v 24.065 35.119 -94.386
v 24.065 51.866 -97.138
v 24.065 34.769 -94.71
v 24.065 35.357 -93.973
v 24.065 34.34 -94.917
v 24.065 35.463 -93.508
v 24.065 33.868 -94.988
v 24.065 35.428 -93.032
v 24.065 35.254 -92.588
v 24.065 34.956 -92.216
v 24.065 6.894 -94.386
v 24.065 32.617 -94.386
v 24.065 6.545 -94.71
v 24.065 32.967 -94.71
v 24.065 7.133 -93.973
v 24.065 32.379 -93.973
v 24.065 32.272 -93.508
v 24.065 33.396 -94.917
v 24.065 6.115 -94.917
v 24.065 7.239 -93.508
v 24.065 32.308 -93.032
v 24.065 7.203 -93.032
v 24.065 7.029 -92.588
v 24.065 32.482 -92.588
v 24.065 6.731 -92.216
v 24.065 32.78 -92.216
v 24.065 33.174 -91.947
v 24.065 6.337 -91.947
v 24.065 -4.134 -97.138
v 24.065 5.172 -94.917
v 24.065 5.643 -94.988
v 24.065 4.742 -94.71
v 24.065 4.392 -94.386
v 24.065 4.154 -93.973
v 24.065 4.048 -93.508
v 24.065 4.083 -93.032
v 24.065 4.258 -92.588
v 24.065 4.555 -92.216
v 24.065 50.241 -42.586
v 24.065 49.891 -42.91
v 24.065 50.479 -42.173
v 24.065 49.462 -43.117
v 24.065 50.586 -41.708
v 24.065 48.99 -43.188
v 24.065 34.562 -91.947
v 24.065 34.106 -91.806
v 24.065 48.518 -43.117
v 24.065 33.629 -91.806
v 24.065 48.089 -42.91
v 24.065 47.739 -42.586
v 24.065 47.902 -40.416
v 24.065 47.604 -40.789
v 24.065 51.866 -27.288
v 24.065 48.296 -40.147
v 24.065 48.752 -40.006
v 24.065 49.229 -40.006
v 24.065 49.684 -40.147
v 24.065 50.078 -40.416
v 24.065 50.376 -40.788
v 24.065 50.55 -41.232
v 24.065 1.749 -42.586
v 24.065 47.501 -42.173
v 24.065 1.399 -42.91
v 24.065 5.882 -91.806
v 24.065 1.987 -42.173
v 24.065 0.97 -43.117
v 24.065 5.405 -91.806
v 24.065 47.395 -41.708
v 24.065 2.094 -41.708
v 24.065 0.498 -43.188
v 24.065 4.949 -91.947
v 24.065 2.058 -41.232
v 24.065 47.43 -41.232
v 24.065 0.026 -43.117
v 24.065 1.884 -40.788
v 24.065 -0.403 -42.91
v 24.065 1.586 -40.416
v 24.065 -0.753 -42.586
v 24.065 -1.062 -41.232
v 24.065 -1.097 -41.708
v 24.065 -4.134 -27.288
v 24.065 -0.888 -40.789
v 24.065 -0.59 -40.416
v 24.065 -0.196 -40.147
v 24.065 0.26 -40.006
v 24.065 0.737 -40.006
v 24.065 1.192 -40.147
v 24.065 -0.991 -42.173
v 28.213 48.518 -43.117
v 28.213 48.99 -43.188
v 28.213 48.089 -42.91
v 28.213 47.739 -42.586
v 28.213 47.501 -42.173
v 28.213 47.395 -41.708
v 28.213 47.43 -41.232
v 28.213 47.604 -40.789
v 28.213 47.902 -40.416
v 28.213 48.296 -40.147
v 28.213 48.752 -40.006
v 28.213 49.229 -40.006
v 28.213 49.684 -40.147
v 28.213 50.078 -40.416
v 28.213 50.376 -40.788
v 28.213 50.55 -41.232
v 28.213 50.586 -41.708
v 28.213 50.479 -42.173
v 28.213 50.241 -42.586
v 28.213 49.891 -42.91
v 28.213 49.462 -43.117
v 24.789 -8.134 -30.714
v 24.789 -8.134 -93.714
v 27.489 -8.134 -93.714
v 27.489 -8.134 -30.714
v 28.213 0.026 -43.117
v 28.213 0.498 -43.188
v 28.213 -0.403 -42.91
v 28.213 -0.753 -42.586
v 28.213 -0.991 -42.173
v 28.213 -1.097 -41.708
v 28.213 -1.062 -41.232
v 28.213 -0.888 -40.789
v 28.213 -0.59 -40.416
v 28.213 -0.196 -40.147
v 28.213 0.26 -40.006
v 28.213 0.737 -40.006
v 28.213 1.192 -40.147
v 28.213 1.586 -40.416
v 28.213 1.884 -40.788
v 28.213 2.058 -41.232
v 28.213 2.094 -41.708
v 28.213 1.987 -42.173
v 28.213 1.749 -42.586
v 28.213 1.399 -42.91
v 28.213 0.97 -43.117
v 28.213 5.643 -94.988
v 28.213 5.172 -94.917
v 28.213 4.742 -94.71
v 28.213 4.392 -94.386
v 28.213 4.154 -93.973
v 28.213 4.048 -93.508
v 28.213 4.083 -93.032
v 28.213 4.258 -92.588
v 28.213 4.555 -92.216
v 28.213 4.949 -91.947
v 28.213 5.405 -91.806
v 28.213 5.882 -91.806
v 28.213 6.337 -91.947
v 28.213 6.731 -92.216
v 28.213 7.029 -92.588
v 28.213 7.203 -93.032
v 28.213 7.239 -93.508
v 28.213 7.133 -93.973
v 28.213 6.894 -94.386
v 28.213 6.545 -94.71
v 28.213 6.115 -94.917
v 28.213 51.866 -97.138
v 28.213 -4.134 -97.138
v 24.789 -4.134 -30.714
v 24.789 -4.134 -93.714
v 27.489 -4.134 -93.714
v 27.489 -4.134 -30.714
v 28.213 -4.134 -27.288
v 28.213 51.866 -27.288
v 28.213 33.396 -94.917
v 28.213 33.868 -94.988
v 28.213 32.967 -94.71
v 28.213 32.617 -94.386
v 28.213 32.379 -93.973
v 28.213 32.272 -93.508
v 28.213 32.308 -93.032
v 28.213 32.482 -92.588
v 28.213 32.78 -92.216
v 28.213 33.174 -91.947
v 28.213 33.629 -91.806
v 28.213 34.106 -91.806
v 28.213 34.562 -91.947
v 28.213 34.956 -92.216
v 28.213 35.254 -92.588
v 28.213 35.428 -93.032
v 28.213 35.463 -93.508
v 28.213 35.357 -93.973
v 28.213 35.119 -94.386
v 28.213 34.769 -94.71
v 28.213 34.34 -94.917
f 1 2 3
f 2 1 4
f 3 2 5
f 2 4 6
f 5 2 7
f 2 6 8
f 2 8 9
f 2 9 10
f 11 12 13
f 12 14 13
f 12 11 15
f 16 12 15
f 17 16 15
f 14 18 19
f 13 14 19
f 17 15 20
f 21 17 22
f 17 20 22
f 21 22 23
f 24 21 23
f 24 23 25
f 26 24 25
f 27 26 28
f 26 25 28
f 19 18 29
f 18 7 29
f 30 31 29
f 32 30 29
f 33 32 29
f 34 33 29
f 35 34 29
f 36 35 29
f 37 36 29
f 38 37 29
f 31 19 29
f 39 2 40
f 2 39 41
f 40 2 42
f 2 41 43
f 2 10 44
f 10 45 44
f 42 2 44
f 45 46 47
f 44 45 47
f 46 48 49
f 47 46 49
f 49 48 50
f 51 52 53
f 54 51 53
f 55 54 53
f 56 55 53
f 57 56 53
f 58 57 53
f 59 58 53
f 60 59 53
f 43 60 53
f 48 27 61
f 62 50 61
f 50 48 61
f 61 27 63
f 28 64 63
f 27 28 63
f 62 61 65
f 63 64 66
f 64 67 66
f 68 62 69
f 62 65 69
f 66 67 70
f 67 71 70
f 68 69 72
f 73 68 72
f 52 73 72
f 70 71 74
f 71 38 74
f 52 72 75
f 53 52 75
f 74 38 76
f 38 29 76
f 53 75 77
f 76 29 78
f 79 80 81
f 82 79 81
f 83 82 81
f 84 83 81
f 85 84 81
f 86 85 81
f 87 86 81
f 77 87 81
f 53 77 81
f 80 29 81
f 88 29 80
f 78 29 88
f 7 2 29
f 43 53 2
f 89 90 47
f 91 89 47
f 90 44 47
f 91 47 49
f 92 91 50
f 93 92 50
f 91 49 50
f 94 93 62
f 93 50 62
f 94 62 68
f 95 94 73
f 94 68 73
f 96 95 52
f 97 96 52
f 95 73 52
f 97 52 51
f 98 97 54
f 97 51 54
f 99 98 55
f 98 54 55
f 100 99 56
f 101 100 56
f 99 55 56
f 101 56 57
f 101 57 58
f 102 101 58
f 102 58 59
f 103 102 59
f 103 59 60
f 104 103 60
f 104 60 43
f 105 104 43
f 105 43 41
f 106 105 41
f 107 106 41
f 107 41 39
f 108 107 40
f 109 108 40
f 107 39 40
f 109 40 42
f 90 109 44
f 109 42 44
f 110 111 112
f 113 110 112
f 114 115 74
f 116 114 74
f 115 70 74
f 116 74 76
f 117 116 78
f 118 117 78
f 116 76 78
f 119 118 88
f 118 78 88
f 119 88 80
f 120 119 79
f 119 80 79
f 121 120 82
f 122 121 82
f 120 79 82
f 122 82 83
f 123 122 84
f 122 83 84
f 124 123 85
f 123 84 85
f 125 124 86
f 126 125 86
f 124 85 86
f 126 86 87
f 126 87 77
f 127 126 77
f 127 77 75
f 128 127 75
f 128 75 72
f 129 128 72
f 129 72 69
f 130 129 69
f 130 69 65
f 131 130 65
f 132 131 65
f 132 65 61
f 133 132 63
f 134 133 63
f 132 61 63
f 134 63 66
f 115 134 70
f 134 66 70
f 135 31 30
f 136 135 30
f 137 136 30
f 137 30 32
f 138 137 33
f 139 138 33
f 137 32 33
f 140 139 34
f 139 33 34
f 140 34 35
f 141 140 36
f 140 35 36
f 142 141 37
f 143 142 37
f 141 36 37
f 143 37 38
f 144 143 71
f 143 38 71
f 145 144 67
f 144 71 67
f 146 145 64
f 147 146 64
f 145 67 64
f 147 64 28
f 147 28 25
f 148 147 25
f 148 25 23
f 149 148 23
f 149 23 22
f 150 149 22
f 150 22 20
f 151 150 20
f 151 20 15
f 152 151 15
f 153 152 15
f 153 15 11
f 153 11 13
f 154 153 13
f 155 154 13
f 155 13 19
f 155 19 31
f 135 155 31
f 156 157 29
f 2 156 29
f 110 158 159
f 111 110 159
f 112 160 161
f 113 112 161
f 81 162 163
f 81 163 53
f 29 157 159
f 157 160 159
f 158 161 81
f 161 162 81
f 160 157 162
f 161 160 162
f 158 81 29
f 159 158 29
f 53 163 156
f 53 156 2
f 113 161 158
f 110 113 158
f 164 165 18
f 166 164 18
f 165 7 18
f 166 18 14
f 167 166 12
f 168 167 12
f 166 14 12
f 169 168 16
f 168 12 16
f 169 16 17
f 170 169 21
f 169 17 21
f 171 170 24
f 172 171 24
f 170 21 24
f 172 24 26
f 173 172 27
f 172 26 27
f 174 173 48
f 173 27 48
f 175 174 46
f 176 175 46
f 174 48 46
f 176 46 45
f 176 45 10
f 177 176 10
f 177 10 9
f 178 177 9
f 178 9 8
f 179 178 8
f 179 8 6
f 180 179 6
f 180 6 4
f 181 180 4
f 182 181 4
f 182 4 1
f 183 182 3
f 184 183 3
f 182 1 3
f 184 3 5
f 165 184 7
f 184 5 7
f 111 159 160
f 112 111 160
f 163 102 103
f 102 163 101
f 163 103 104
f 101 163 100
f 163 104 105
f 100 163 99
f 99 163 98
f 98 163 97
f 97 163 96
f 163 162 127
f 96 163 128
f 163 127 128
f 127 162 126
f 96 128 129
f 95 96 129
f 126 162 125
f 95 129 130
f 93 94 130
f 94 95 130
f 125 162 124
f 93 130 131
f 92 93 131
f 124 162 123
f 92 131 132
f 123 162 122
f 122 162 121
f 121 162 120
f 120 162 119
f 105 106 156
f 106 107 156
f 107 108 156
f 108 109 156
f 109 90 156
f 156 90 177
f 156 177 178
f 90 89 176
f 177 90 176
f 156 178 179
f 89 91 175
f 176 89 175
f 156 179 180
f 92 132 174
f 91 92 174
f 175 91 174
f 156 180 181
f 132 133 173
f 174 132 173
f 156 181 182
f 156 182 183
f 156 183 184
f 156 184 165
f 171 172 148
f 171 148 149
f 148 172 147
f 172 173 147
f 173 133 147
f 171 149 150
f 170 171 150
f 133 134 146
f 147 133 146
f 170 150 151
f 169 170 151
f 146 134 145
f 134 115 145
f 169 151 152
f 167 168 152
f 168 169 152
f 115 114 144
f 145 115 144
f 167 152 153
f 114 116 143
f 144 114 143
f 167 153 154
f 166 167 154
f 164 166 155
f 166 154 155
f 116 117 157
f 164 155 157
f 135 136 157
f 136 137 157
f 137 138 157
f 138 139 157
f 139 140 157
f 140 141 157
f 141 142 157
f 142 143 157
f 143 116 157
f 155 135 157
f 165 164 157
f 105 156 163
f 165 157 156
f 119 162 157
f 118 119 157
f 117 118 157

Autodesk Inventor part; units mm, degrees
ref_plane "YZ Plane" through (0, 0, 0) normal (1, 0, 0) x (0, 1, 0)
ref_plane "XZ Plane" through (0, 0, 0) normal (0, 1, 0) x (-1, 0, 0)
ref_plane "Work Plane1" through (21.863, -4.1339, -62.2135) normal (0, 1, 0) x (-1, 0, 0)
sketch "Sketch1" plane through (21.863, -4.1339, -62.2135) normal (0, 1, 0) x (-1, 0, 0)
  line L0 (-6.35, 34.925) -> (-6.35, -34.925) construction
  line L1 (-6.35, -34.925) -> (33.3375, -34.925) construction
  line L2 (33.3375, -34.925) -> (33.3375, 34.925) construction
  line L3 (33.3375, 34.925) -> (-6.35, 34.925) construction
  line L4 (-6.35, 34.925) -> (-6.35, -34.925)
  line L5 (-2.2016, -34.925) -> (-2.2016, 34.925)
  line L6 (-6.35, -34.925) -> (-2.2016, -34.925)
  line L7 (-6.35, 34.925) -> (-2.2016, 34.925)
  point P0 (21.863, 62.2135)
extrude "Extrusion1" add sketch "Sketch1" along normal blind 56
sketch "Sketch3" plane through (21.863, -4.1339, -62.2135) normal (0, -1, 0) x (1, 0, 0)
  line L0 (6.35, 34.925) -> (2.2016, 34.925)
  line L1 (2.2016, 34.925) -> (2.2016, -34.925)
  line L2 (2.2016, -34.925) -> (6.35, -34.925)
  line L3 (6.35, -34.925) -> (6.35, 34.925)
  line L4 (6.35, 34.925) -> (6.35, -34.925) construction
  line L5 (6.35, 0) -> (2.2016, 0) construction
  line L6 (2.2016, 34.925) -> (6.35, 34.925) construction
  line L7 (4.2758, 34.925) -> (4.2758, -34.925) construction
  line L8 (5.6258, 31.5) -> (2.9258, 31.5) construction
  line L9 (2.9258, 31.5) -> (2.9258, -31.5) construction
  line L10 (2.9258, -31.5) -> (5.6258, -31.5) construction
  line L11 (5.6258, -31.5) -> (5.6258, 31.5) construction
  line L12 (5.6258, 31.5) -> (2.9258, 31.5)
  line L13 (2.9258, 31.5) -> (2.9258, -31.5)
  line L14 (2.9258, -31.5) -> (5.6258, -31.5)
  line L15 (5.6258, -31.5) -> (5.6258, 31.5)
  line L16 (4.2758, 31.5) -> (4.2758, -31.5) construction
  line L17 (5.6258, 0) -> (2.9258, 0) construction
  point P0 (-21.863, 62.2135)
  point P1 (4.2758, 0)
  dimension "d14" = 2.7
  dimension "d15" = 63
extrude "Extrusion2" add sketch "Sketch3" along normal blind 4 contours L15 L14 L13 L12
sketch "Sketch4" plane through (28.213, -4.1339, -27.2885) normal (1, 0, 0) x (0, 0, -1)
  circle A0 centre (14.3, 53.124) radius 1.6
  circle A1 centre (14.3, 4.632) radius 1.6
  line L0 (66.1, 7.0031) -> (66.1, 9.7771) construction
  circle A2 centre (66.1, 9.7771) radius 1.6
  circle A3 centre (66.1, 38.0018) radius 1.6
  point P0 (-27.2885, 4.1339)
  dimension "d20" = 3.2
  dimension "d22" = 3.2
  dimension "d24" = 2.774
  dimension "d25" = 3.2
  dimension "d27" = 3.2
hole "Hole2" at (28.213, 48.9901, -41.5885) at (28.213, 0.4981, -41.5885) at (28.213, 5.6432, -93.3885) at (28.213, 33.8679, -93.3885) direction (-1, 0, 0) diameter 3.2 end through all
properties part number "controller_case"
